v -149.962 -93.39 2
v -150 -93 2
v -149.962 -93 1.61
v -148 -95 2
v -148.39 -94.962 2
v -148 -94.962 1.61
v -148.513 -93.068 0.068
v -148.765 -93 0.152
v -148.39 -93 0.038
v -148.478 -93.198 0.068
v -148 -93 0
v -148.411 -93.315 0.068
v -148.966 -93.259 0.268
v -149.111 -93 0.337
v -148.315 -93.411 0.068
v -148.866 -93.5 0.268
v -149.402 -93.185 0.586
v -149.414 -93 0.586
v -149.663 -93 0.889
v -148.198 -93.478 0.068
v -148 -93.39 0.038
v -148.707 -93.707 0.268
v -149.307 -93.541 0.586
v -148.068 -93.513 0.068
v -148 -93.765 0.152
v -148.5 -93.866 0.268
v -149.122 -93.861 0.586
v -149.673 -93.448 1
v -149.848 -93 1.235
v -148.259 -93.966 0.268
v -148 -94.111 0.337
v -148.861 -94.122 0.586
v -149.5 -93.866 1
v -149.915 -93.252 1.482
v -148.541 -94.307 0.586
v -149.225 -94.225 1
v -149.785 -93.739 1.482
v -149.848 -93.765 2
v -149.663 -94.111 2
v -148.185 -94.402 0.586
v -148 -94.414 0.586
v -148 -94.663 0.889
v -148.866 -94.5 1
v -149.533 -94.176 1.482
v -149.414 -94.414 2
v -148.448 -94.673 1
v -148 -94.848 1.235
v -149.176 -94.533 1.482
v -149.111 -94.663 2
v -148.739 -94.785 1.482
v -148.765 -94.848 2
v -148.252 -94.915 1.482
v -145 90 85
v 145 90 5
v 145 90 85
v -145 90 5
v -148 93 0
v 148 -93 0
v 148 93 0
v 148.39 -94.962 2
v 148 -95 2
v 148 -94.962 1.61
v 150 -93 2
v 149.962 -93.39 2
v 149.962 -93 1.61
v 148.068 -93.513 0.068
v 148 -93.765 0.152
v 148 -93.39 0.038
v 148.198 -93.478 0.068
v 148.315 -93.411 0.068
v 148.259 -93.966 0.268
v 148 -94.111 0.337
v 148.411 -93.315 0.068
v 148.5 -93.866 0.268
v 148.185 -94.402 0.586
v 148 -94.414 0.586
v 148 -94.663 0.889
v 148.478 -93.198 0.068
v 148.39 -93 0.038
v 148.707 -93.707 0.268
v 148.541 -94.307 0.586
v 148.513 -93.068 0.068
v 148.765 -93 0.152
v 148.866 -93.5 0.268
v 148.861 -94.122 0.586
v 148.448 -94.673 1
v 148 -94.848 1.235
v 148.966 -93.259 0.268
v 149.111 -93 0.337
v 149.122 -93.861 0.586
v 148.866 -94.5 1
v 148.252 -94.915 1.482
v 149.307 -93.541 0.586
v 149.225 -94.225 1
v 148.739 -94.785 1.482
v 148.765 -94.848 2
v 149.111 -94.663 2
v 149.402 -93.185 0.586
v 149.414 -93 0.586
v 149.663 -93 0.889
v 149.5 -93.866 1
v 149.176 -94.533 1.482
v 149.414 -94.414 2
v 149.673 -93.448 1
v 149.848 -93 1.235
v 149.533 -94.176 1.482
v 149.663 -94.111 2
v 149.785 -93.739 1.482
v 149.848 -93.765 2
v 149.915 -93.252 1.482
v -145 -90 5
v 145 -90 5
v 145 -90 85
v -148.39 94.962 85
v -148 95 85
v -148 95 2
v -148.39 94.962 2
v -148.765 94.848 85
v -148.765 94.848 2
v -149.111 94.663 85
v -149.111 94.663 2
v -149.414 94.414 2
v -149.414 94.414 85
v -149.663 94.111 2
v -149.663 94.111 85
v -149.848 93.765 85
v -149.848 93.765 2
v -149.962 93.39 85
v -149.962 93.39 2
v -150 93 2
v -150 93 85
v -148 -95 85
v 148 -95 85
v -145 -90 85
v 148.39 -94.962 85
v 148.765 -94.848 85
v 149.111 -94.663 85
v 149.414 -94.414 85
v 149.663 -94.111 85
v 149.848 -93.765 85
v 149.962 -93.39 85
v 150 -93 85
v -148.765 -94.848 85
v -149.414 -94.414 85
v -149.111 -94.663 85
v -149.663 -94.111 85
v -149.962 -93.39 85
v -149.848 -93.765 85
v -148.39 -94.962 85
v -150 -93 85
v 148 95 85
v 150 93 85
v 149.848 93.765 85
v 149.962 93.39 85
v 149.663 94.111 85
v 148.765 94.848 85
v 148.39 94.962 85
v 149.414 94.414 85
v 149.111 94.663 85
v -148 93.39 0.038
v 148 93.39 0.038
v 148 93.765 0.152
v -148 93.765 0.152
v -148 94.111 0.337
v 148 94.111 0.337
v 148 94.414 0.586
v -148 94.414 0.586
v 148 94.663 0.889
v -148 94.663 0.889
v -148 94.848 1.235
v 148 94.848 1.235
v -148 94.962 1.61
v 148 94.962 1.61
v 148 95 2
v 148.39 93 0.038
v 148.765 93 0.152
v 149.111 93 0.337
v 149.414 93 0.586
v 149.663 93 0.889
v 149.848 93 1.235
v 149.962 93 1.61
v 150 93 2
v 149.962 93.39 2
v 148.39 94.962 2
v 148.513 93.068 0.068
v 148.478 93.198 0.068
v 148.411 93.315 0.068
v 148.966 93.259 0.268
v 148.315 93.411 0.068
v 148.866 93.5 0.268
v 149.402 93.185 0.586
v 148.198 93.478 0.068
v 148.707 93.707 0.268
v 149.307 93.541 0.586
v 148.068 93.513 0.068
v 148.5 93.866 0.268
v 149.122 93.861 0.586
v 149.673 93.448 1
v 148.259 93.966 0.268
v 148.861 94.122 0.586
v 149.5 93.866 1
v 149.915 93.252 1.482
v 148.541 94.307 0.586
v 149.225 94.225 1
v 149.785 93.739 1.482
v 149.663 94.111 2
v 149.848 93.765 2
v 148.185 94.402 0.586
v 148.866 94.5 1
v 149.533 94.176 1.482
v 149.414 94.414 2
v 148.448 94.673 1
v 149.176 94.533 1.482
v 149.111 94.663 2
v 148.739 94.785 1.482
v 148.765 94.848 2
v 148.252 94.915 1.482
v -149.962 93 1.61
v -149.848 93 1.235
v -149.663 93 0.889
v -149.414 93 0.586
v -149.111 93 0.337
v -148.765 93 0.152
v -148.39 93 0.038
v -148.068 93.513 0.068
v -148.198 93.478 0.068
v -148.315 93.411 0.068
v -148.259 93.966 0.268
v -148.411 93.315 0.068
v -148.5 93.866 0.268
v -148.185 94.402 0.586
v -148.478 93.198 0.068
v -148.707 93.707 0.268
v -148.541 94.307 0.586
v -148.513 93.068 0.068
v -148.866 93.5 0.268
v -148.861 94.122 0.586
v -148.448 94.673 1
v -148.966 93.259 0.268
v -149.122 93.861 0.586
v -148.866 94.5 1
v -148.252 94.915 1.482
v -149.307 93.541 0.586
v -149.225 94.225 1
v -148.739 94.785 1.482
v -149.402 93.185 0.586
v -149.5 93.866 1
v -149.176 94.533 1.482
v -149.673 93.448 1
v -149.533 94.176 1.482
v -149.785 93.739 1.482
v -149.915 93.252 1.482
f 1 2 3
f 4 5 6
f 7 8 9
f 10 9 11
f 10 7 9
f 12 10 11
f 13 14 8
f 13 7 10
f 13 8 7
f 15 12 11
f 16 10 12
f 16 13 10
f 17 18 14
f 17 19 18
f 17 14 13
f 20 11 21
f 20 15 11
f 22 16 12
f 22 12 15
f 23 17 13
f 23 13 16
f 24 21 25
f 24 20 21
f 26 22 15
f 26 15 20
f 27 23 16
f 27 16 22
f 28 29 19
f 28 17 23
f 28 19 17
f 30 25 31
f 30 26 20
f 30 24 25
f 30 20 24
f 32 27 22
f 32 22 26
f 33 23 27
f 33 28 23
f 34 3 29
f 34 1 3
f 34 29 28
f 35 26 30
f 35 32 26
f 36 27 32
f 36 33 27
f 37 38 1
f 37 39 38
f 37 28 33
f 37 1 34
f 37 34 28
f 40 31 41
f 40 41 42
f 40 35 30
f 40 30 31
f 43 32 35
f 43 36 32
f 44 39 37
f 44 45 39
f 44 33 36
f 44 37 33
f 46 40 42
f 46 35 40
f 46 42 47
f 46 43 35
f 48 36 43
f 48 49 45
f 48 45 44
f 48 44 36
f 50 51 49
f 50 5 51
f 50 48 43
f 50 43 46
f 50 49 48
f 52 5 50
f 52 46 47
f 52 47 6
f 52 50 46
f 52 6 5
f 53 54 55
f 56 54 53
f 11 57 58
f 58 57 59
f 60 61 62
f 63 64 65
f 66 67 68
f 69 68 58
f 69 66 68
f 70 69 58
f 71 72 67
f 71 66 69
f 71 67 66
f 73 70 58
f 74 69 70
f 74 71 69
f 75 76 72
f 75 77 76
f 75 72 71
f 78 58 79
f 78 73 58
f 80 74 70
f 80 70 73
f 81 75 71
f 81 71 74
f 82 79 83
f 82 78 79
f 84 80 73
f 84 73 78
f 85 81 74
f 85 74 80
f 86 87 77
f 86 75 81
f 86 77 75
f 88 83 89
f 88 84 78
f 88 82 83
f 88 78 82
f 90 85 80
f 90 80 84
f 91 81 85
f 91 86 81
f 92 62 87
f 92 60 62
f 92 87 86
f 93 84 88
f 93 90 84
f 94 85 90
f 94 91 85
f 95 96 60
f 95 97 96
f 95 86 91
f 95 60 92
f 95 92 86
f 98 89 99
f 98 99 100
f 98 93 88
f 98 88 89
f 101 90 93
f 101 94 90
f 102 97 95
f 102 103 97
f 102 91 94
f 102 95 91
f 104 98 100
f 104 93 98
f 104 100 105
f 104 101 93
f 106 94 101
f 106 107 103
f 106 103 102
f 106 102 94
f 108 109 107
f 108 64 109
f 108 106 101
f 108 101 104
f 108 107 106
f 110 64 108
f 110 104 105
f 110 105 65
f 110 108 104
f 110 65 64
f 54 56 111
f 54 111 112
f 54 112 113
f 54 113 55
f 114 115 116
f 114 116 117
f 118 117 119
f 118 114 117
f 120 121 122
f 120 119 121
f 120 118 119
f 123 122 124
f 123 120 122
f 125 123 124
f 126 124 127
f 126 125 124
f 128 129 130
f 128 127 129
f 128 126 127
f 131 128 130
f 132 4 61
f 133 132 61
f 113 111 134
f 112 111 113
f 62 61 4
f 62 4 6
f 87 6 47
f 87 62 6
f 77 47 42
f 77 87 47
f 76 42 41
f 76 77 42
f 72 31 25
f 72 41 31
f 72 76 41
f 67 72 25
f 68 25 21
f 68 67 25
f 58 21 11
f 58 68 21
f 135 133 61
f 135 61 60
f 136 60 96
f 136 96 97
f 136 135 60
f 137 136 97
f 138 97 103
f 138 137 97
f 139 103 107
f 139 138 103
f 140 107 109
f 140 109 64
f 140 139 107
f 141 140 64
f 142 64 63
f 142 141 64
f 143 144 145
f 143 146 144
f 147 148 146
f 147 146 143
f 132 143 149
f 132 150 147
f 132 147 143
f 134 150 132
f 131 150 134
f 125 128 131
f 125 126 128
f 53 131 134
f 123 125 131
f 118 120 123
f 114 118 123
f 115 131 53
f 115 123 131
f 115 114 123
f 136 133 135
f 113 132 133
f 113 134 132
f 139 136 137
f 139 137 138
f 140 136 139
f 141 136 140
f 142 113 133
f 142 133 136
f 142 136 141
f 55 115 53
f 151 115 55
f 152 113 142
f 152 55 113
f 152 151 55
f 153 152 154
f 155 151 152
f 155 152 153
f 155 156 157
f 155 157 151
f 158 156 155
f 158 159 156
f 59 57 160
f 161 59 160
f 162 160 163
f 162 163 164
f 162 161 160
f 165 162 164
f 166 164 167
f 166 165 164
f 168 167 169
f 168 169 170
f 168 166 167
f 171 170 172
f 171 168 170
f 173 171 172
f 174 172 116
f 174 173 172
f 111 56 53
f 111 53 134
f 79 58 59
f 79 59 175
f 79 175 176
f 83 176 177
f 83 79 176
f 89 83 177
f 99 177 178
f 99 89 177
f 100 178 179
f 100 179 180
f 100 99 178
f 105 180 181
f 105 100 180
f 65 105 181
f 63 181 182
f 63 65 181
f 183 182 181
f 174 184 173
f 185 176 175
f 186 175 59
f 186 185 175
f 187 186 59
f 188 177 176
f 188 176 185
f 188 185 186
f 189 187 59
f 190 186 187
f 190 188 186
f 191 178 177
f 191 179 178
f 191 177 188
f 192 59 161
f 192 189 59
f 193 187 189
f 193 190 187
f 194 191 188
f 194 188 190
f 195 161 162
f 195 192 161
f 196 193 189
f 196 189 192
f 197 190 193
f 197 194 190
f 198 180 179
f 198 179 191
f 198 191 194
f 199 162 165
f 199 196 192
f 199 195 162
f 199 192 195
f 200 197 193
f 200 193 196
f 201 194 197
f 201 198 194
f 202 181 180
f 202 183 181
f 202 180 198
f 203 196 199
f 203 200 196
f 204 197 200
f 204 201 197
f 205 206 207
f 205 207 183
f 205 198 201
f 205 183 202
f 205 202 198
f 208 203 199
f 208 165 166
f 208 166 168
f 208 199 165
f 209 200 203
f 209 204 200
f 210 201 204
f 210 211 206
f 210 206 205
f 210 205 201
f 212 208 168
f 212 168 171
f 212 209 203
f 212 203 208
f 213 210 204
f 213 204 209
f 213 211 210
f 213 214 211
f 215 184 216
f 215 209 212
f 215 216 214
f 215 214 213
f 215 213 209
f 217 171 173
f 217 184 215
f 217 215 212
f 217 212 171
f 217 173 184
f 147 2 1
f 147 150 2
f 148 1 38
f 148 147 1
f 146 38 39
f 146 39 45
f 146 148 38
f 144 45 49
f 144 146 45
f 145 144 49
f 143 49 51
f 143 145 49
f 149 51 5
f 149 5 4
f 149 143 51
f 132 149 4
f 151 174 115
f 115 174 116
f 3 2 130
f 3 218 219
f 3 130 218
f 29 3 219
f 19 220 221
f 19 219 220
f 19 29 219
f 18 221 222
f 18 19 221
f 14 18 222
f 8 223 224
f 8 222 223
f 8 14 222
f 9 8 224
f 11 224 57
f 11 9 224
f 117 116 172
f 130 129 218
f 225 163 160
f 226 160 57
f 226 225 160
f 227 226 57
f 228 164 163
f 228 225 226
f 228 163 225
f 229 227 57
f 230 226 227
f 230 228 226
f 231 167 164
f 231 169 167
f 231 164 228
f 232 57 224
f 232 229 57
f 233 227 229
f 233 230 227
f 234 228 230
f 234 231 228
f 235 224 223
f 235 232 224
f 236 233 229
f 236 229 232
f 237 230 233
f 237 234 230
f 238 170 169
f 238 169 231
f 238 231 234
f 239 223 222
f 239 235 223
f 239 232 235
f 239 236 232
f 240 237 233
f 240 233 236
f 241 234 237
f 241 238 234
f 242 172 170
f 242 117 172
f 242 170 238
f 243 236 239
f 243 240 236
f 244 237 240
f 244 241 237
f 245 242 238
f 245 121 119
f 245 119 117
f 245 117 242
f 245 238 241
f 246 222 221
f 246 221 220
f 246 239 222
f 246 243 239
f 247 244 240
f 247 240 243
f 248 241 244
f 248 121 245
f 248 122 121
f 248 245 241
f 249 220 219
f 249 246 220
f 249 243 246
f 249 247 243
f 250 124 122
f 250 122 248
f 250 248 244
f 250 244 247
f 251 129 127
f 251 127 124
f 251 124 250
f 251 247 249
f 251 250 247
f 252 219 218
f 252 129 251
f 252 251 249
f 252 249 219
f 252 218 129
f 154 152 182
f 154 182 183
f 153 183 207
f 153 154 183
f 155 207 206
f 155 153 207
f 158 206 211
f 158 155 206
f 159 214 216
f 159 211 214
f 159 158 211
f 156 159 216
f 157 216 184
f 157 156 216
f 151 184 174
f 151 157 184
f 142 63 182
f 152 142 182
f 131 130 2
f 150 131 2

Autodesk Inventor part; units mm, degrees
ref_plane "YZ Plane" through (0, 0, 0) normal (1, 0, 0) x (0, 1, 0)
ref_plane "XZ Plane" through (0, 0, 0) normal (0, 1, 0) x (-1, 0, 0)
ref_plane "XY Plane" through (0, 0, 0) normal (0, 0, 1) x (1, 0, 0)
sketch "Sketch3" plane through (0, 0, 0) normal (0, 0, 1) x (1, 0, 0)
  line L0 (0, -133) -> (0, 133) projected
  line L1 (-210, 0) -> (210, 0) projected
  line L2 (-150, -95) -> (150, -95)
  line L3 (150, -95) -> (150, 95)
  line L4 (150, 95) -> (-150, 95)
  line L5 (-150, 95) -> (-150, -95)
  line L6 (-150, -95) -> (150, 95) construction
  line L7 (150, -95) -> (-150, 95) construction
  line L8 (-145, -90) -> (145, -90)
  line L9 (145, -90) -> (145, 90)
  line L10 (145, 90) -> (-145, 90)
  line L11 (-145, 90) -> (-145, -90)
  line L12 (-145, -90) -> (145, 90) construction
  line L13 (145, -90) -> (-145, 90) construction
  point P0 (0, 0)
  dimension "d0" = 300
  dimension "d1" = 190
  dimension "d2" = 290
  dimension "d3" = 180
extrude "Extrusion1" add sketch "Sketch3" along normal blind 85 contours L2 L5 L1 L11 L8 L0 | L0 L8 L9 L1 L3 L2 | L5 L4 L0 L10 L11 L1 | L1 L9 L10 L0 L4 L3
extrude "Extrusion2" add sketch "Sketch3" along normal blind 5 contours L8 L11 L1 L0 | L0 L1 L9 L8 | L1 L11 L10 L0 | L0 L10 L9 L1
fillet "Fillet1" radius 2 8 edges at (150, -95, 42.5) (150, 95, 42.5) (-150, 95, 42.5) (-150, -95, 42.5) (-150, 0, 0) (0, 95, 0) (0, -95, 0) (150, 0, 0)
equation "\"BendRadius\" = Thickness"
equation "\"BendReliefWidth\" = Thickness"
equation "\"BendReliefDepth\" = 0.5 * Thickness"
equation "\"CornerReliefSize\" = 4 * Thickness"
equation "\"MinimumRemnant\" = 2 * Thickness"
equation "\"TransitionRadius\" = BendRadius"
equation "\"JacobiRadiusSize\" = BendRadius"
equation "\"GapSize\" = Thickness"
equation "\"Thickness\" = 0.5"
properties part number "Batterybox"
